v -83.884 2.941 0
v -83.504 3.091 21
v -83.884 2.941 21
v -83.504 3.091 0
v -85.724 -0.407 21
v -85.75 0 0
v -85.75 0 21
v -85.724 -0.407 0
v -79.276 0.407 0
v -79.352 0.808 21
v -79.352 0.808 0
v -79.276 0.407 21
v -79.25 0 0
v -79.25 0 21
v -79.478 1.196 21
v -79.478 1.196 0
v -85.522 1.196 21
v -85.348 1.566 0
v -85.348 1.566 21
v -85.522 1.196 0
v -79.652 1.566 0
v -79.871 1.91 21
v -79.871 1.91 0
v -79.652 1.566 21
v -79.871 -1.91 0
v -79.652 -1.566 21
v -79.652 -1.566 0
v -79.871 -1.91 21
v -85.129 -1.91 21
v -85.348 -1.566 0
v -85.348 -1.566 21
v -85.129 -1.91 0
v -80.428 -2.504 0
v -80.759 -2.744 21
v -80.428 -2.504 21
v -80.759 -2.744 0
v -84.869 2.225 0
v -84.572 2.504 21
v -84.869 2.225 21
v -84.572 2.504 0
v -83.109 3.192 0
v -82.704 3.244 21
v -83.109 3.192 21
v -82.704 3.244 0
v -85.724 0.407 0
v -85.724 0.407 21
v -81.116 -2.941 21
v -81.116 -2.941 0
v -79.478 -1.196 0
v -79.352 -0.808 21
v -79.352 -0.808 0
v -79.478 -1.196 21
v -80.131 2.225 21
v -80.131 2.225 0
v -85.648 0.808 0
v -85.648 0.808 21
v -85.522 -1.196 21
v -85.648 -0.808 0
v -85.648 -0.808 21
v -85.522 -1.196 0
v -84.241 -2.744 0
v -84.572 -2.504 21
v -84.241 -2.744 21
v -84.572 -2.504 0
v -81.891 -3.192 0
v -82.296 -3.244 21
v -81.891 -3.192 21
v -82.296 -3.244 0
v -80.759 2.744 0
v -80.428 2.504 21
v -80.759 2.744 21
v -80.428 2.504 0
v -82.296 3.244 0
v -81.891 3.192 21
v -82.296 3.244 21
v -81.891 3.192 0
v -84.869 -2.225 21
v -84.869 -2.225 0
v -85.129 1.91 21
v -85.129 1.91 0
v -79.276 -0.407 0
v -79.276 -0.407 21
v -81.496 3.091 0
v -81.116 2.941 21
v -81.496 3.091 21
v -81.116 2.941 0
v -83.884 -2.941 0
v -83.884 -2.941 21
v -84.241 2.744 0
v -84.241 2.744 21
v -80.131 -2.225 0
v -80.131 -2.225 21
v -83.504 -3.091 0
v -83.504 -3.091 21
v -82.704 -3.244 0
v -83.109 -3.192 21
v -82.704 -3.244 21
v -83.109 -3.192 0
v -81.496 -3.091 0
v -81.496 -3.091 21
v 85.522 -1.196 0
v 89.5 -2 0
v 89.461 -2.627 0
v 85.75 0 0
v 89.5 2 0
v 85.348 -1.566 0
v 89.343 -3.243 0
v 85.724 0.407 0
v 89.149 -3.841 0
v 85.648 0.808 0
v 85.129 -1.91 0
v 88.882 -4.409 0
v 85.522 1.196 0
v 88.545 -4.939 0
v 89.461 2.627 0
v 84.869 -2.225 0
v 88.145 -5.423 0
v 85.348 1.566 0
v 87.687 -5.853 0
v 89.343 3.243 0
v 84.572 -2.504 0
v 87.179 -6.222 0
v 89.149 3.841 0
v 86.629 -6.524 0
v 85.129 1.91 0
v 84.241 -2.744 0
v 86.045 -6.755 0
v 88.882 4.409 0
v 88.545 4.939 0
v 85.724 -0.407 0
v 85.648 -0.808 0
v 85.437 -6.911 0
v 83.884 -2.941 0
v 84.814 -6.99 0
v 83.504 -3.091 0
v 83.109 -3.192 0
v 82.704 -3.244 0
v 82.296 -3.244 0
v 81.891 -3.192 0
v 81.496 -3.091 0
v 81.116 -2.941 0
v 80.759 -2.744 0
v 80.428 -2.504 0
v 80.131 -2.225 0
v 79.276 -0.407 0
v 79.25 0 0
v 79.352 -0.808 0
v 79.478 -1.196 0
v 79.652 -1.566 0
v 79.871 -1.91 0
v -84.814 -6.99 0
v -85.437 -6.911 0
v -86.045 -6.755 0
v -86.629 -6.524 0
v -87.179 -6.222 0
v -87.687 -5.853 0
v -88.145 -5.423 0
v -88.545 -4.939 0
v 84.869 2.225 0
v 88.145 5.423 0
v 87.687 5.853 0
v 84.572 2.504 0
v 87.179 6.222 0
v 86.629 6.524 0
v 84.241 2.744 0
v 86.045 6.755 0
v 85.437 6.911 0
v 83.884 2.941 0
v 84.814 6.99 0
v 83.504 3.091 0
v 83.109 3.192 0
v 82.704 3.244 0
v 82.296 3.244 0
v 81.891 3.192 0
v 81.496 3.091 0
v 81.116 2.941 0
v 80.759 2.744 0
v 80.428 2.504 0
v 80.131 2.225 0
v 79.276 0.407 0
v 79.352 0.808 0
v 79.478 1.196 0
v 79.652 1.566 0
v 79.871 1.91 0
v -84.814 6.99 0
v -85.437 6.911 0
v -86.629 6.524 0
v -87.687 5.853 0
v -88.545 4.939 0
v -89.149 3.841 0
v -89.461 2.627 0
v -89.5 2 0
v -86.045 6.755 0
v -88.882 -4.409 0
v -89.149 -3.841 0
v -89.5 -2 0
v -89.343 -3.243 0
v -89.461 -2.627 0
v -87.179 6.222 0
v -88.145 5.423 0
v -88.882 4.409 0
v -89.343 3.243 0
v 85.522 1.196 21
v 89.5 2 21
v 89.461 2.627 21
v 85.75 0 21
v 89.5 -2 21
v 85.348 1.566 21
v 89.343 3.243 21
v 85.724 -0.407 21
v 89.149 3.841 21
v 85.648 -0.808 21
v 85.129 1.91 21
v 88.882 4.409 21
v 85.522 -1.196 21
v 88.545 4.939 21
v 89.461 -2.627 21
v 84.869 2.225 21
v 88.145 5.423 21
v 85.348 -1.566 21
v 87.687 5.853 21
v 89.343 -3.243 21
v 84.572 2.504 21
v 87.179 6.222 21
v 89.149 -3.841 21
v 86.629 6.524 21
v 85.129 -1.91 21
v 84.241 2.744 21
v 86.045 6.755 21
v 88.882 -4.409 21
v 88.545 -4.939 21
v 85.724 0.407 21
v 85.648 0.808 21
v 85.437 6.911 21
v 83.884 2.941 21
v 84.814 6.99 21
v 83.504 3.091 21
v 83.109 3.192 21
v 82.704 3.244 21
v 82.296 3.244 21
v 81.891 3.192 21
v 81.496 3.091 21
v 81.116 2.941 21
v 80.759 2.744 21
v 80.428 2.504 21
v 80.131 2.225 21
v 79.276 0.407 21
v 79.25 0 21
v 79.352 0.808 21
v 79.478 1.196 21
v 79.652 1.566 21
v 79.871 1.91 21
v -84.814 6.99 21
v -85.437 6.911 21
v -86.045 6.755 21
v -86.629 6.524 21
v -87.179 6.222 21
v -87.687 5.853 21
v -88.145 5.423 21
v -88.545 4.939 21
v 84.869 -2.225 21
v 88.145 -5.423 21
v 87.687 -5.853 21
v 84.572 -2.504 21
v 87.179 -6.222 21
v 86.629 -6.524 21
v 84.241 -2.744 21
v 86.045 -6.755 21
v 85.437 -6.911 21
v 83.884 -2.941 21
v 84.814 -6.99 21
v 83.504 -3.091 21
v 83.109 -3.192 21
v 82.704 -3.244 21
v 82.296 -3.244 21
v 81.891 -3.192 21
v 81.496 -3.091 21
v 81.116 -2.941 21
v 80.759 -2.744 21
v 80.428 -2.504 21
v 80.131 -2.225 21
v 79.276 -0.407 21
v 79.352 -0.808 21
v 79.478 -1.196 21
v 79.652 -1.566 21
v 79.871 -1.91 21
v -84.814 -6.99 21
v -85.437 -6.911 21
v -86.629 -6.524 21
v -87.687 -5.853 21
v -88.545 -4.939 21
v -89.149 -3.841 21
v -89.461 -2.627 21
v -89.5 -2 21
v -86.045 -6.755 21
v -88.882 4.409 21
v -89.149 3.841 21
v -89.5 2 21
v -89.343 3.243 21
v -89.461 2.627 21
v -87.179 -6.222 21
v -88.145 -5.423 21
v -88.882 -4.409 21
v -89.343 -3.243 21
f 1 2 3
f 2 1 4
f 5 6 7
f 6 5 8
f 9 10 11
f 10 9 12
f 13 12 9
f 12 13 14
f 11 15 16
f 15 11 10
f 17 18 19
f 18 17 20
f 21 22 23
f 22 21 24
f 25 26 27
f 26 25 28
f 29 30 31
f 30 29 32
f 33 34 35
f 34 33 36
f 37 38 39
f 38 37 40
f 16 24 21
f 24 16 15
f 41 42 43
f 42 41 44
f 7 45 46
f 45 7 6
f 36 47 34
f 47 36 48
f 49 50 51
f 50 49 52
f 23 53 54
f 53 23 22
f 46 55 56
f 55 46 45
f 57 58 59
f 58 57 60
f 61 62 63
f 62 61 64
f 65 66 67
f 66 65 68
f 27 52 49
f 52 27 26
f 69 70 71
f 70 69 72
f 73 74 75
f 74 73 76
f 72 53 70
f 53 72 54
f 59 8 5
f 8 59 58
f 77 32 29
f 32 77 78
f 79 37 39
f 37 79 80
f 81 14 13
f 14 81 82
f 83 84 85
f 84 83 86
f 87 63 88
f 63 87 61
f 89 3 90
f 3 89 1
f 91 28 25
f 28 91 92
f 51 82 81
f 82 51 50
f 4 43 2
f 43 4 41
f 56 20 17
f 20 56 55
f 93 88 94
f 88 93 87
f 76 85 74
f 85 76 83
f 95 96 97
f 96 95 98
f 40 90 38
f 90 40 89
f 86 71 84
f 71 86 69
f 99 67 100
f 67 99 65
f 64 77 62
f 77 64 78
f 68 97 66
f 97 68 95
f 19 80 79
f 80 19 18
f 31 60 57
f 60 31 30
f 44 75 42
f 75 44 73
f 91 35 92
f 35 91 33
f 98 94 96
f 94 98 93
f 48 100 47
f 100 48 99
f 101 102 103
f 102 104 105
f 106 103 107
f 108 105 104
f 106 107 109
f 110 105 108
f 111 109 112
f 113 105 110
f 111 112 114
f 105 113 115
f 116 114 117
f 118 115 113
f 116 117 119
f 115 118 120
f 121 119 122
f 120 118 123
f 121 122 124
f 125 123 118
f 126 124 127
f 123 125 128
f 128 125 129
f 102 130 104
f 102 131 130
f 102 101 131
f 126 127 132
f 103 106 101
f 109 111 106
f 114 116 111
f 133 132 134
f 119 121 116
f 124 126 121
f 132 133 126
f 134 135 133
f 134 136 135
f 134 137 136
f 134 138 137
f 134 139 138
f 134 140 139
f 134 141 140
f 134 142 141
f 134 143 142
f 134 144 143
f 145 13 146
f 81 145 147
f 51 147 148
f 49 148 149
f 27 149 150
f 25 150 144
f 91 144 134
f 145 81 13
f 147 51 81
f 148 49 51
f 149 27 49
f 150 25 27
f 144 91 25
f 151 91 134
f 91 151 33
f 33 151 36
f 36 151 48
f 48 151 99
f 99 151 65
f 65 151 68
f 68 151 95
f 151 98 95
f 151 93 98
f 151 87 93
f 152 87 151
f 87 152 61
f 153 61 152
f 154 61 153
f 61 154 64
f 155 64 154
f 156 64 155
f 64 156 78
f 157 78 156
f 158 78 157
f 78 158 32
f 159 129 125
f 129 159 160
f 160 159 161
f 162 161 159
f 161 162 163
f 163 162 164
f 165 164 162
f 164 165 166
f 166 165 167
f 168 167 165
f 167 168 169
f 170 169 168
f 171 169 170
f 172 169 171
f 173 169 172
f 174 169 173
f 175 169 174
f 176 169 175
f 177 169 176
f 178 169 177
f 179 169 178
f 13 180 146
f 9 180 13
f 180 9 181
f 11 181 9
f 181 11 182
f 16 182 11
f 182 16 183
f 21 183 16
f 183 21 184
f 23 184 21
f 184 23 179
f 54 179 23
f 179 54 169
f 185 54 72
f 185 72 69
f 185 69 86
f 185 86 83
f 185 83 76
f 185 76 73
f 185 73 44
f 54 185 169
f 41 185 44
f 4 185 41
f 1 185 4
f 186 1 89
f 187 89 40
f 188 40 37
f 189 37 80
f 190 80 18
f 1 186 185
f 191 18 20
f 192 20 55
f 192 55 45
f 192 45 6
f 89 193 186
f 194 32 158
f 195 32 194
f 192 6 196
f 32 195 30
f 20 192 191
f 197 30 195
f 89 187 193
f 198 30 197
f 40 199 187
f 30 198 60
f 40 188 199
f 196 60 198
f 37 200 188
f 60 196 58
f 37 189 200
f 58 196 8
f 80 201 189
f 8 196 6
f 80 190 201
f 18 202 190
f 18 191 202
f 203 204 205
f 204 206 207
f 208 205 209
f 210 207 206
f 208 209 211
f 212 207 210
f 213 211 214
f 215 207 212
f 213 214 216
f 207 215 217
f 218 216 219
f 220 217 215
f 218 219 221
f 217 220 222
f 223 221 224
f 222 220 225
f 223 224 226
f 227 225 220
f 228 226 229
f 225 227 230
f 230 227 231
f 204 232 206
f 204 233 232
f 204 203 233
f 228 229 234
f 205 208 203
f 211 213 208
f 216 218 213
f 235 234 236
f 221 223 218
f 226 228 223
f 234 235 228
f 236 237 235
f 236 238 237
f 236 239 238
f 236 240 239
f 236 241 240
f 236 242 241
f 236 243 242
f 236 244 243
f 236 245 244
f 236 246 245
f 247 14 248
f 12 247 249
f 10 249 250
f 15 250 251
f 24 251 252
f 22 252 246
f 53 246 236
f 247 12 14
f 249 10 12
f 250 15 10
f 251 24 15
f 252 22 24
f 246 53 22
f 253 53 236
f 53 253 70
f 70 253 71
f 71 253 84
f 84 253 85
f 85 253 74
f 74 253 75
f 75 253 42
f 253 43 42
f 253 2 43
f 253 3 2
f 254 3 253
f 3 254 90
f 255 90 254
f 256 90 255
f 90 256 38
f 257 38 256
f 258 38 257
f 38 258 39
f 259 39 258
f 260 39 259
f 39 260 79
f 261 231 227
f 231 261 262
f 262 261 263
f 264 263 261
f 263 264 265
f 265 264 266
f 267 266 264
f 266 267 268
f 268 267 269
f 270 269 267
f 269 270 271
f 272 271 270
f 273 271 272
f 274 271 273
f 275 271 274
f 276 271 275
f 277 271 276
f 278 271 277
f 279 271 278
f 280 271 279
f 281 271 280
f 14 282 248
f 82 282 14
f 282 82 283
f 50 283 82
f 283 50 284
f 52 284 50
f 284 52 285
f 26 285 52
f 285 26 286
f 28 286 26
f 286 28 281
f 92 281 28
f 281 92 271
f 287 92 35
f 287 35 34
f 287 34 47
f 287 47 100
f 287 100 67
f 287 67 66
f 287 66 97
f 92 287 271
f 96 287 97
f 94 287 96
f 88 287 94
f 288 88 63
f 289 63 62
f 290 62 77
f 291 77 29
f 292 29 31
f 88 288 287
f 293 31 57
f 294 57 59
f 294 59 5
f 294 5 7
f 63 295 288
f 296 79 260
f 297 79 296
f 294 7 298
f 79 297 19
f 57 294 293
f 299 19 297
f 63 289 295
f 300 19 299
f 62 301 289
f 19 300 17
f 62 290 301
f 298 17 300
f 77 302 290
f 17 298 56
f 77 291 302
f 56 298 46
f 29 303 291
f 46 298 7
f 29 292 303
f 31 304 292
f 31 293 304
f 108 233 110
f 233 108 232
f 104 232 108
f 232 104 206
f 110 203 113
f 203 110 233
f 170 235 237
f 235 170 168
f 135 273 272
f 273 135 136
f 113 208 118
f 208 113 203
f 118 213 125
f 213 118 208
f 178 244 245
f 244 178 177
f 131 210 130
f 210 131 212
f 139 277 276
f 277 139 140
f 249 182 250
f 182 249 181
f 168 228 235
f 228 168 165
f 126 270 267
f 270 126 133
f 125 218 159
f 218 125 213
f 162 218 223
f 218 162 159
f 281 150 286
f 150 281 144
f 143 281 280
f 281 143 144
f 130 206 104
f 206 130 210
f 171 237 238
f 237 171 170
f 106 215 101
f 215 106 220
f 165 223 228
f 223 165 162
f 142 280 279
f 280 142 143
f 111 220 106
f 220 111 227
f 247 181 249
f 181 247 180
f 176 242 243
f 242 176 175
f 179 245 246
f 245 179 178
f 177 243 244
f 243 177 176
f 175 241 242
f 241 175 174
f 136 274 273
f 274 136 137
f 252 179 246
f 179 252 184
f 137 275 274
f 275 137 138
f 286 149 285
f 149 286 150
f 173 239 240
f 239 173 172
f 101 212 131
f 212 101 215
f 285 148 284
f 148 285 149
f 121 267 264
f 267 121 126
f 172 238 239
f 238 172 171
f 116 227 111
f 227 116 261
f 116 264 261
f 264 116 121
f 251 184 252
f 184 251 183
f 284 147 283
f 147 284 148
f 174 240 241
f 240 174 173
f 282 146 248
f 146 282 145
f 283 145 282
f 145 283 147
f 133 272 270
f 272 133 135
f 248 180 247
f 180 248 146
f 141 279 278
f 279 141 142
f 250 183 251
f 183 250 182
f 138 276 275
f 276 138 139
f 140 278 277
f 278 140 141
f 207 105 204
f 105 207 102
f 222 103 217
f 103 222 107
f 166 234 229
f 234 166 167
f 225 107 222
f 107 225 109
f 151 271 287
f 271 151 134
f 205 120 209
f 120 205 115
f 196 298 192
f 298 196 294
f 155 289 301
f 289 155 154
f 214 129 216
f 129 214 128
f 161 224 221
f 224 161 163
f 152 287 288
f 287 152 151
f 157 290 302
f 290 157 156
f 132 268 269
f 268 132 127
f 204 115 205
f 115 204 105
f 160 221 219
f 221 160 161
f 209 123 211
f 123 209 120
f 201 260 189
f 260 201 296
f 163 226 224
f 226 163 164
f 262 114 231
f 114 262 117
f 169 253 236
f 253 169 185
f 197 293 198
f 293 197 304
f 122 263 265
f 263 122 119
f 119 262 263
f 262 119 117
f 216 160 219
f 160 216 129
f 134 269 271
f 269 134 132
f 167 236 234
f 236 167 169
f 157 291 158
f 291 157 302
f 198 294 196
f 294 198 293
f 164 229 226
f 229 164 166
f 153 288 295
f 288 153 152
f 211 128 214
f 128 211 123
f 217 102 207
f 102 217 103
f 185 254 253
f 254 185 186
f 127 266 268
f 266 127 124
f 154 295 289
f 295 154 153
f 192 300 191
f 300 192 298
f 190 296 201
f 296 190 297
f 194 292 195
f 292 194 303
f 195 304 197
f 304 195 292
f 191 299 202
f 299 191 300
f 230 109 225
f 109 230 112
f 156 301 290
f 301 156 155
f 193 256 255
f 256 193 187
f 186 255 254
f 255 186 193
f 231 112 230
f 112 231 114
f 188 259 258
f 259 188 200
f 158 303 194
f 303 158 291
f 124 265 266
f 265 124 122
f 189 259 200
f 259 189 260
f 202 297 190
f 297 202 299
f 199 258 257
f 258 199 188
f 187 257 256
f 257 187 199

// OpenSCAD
$fn = 50;


difference() {
	union() {
		hull() {
			translate(v = [-84.5000000000, 2.0000000000, 0]) {
				cylinder(h = 21, r = 5);
			}
			translate(v = [84.5000000000, 2.0000000000, 0]) {
				cylinder(h = 21, r = 5);
			}
			translate(v = [-84.5000000000, -2.0000000000, 0]) {
				cylinder(h = 21, r = 5);
			}
			translate(v = [84.5000000000, -2.0000000000, 0]) {
				cylinder(h = 21, r = 5);
			}
		}
	}
	union() {
		translate(v = [-82.5000000000, 0.0000000000, 0]) {
			cylinder(h = 21, r = 3.2500000000);
		}
		translate(v = [82.5000000000, 0.0000000000, 0]) {
			cylinder(h = 21, r = 3.2500000000);
		}
		translate(v = [-82.5000000000, 0.0000000000, 0]) {
			cylinder(h = 21, r = 1.8000000000);
		}
		translate(v = [82.5000000000, 0.0000000000, 0]) {
			cylinder(h = 21, r = 1.8000000000);
		}
		translate(v = [-82.5000000000, 0.0000000000, 0]) {
			cylinder(h = 21, r = 1.8000000000);
		}
		translate(v = [82.5000000000, 0.0000000000, 0]) {
			cylinder(h = 21, r = 1.8000000000);
		}
		translate(v = [-82.5000000000, 0.0000000000, 0]) {
			cylinder(h = 21, r = 1.8000000000);
		}
		translate(v = [82.5000000000, 0.0000000000, 0]) {
			cylinder(h = 21, r = 1.8000000000);
		}
	}
}
